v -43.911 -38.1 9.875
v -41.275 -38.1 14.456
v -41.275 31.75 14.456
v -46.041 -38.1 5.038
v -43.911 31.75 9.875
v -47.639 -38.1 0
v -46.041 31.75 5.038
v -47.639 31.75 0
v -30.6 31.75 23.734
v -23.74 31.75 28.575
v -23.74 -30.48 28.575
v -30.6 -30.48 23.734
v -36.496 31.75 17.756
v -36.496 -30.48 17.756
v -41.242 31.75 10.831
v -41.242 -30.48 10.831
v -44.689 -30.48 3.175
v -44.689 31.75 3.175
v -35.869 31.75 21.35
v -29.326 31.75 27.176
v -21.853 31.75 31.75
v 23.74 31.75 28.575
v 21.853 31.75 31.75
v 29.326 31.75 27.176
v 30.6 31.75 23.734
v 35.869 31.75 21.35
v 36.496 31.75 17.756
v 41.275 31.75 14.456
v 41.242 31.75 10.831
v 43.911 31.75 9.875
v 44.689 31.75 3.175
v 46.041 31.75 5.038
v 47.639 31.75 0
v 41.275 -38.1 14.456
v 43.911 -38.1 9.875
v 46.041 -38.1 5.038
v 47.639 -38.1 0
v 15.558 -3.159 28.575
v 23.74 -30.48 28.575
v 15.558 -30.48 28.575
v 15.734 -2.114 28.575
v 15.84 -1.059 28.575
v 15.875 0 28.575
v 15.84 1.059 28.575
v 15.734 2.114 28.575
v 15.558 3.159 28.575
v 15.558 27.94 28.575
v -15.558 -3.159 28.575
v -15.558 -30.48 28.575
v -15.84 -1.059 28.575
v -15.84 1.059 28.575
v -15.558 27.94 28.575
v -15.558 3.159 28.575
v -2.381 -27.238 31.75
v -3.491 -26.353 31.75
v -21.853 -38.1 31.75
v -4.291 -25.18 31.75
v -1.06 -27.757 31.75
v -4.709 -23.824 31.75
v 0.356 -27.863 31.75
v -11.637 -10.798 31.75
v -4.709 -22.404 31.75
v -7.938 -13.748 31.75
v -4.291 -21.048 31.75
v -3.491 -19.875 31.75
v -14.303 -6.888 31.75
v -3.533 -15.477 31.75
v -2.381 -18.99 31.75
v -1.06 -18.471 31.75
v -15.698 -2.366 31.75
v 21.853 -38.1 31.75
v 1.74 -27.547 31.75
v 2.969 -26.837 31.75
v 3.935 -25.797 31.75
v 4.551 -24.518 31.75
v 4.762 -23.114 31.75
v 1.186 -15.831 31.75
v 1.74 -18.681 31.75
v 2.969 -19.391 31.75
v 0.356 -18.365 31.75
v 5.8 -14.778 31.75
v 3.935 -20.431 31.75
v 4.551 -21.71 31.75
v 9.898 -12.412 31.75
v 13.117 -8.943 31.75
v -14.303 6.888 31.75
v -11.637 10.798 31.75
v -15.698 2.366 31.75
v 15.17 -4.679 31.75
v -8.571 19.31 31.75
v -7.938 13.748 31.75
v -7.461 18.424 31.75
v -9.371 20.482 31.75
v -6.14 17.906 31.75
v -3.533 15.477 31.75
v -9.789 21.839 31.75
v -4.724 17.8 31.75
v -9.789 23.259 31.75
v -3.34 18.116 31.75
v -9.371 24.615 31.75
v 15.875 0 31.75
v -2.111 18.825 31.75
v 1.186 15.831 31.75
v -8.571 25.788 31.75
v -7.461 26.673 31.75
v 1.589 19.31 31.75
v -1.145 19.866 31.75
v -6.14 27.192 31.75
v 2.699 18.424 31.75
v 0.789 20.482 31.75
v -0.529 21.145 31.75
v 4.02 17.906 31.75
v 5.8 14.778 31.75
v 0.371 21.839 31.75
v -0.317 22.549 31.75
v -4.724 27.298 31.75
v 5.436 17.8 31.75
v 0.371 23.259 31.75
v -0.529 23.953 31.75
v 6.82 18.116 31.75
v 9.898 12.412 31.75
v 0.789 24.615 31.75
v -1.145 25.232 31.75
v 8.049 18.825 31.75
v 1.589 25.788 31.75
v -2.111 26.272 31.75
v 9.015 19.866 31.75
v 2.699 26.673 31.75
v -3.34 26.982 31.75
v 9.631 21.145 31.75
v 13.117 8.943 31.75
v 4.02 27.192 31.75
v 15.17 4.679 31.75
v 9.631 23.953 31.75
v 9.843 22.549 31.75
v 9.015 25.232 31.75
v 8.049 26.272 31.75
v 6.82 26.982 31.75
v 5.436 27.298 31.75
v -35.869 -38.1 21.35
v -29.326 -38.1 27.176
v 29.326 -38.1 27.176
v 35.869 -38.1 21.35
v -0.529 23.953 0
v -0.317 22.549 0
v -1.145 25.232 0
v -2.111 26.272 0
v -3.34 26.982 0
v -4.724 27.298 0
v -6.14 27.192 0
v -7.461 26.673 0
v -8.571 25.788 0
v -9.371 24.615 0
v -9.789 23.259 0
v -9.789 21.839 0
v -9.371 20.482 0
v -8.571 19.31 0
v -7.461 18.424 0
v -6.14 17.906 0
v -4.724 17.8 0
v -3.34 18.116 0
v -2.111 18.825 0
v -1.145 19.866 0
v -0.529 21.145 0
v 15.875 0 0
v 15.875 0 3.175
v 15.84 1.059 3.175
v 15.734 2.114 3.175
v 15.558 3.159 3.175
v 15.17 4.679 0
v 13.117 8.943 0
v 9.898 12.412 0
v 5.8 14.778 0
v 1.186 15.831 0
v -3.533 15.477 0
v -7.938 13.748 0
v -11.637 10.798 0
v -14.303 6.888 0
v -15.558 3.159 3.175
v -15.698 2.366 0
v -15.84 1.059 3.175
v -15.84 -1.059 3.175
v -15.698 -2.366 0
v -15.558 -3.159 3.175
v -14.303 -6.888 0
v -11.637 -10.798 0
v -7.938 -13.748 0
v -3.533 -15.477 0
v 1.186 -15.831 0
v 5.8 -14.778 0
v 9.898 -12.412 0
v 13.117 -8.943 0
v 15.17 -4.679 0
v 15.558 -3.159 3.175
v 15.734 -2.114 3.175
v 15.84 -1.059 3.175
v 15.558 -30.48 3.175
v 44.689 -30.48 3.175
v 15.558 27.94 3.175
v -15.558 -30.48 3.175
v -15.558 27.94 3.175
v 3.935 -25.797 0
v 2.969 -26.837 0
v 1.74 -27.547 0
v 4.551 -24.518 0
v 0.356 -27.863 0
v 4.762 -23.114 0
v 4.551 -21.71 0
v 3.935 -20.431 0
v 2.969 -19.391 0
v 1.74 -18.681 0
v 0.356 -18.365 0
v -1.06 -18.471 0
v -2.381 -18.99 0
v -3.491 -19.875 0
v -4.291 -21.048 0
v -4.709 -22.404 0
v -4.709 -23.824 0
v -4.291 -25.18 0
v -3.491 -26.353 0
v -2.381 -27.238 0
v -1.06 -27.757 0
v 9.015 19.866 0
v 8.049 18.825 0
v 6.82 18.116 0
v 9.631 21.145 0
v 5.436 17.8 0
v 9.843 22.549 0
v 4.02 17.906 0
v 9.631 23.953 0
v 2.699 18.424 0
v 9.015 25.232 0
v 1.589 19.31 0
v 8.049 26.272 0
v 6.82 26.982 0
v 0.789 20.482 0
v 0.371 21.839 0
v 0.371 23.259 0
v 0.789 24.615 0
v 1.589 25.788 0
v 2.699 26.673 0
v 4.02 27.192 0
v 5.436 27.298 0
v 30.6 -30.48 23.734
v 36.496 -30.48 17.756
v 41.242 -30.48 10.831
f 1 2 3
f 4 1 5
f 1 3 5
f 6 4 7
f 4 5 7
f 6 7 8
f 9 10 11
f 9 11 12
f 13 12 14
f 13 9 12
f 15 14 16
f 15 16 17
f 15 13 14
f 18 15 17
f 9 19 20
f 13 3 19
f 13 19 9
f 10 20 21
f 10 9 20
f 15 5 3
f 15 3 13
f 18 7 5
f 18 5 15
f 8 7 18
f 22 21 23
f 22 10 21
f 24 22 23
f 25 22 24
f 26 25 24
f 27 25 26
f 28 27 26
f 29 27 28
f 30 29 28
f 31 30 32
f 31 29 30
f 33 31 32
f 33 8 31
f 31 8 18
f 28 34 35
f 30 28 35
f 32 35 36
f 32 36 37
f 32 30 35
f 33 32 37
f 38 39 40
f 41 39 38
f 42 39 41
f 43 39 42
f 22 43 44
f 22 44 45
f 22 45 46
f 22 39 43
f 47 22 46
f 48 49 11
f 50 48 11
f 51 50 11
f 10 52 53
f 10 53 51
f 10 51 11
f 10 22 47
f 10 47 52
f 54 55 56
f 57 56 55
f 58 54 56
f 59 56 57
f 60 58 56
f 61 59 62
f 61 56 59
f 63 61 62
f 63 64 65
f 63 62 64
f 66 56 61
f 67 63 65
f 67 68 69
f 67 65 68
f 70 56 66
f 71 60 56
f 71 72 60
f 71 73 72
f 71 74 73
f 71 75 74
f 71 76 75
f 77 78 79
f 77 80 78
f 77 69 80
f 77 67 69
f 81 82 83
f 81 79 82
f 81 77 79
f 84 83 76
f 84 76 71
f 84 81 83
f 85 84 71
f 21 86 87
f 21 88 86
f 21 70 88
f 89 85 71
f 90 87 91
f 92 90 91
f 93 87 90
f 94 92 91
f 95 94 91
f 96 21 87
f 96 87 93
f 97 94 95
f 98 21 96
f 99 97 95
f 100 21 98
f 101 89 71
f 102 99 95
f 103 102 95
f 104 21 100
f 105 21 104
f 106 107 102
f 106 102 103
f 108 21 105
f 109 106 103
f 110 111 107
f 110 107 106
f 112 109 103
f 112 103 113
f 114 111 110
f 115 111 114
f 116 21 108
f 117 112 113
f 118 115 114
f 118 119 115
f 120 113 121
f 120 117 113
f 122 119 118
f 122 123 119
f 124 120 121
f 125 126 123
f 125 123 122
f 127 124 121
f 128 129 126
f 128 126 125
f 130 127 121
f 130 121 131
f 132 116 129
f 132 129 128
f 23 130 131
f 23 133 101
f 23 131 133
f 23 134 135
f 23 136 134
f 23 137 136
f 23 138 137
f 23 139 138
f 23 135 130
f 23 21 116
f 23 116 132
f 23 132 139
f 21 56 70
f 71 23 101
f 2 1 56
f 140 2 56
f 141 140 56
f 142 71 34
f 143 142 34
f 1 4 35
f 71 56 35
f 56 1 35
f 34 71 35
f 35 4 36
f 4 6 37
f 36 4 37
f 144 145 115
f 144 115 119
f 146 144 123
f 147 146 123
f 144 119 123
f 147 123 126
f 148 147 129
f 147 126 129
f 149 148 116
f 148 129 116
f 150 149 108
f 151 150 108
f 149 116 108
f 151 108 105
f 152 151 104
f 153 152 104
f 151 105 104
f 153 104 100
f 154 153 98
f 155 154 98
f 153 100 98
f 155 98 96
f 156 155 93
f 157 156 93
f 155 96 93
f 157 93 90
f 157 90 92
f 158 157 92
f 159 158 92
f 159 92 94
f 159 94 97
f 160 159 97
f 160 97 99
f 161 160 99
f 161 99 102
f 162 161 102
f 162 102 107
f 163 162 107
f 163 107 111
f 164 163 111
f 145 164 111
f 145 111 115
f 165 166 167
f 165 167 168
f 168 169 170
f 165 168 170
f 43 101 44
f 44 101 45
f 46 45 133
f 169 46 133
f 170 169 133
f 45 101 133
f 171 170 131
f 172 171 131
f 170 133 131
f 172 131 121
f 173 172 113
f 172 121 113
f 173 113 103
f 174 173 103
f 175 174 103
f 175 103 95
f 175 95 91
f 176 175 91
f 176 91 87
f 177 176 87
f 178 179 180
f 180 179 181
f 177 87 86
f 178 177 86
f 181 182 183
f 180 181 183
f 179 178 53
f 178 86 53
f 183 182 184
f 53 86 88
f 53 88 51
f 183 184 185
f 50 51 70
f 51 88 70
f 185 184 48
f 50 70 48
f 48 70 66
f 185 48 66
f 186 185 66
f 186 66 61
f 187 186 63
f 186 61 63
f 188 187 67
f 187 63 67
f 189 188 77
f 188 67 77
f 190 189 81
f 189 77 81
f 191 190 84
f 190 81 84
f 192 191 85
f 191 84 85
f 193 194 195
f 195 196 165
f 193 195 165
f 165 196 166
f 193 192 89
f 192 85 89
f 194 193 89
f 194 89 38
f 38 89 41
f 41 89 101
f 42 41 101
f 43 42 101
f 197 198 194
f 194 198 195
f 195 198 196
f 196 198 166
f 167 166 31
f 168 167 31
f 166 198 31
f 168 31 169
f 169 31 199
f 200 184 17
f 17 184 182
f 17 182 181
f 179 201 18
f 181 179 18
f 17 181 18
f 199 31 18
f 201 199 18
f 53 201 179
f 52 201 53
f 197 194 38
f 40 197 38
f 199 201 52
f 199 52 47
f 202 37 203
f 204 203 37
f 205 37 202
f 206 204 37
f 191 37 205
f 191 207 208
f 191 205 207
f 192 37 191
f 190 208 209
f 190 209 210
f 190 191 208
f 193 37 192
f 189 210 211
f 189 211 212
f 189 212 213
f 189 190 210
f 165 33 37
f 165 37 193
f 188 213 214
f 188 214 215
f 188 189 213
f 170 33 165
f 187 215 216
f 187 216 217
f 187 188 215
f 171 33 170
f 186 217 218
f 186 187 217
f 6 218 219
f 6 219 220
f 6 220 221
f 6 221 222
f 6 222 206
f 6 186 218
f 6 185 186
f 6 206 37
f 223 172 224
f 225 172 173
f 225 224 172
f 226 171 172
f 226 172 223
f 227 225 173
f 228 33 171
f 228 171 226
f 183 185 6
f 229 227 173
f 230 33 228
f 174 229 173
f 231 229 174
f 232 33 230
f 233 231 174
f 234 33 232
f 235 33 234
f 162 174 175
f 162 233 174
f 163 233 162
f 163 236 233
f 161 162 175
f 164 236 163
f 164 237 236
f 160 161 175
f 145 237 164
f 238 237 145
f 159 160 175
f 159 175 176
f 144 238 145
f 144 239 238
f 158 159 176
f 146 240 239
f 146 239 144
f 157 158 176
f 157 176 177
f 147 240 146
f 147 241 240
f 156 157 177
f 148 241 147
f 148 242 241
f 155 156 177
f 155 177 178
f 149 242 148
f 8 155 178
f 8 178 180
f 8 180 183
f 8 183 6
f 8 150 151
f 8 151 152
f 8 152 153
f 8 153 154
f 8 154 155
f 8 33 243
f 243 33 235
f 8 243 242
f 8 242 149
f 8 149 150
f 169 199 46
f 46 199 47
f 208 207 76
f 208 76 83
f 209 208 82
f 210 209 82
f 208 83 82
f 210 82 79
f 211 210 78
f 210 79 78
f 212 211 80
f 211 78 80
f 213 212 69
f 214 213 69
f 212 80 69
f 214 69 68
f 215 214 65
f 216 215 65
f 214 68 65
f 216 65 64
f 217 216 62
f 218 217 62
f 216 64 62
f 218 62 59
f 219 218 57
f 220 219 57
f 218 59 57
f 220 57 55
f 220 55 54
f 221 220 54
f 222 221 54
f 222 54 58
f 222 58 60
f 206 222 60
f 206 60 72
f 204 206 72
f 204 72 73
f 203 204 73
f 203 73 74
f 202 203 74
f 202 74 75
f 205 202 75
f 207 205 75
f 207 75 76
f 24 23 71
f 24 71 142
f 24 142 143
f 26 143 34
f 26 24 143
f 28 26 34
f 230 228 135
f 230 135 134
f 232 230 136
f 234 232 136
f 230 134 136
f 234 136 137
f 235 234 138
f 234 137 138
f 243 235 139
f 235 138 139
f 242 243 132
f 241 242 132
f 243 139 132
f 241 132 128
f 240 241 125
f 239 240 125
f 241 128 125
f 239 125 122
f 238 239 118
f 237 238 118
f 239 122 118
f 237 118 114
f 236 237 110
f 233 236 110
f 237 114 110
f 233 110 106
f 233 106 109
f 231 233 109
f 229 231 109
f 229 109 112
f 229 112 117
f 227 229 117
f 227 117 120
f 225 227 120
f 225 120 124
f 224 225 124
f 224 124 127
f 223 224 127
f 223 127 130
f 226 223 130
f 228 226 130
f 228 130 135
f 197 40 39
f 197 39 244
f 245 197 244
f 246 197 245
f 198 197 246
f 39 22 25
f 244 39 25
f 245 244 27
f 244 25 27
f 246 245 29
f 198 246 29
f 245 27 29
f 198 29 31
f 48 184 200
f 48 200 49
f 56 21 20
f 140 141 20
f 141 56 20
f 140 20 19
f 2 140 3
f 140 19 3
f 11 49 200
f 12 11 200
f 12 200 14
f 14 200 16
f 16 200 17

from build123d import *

# Parameters (mm, degrees)
SKETCH1_W           = 82.55
SKETCH1_H           = 76.2
BOSS_EXTRUDE1_DEPTH = 31.75
SKETCH2_R           = 4.7625
CUT_EXTRUDE1_DEPTH  = 32.75
SKETCH4_R           = 15.875
CUT_EXTRUDE3_DEPTH  = 32.75
BOSS_EXTRUDE3_DEPTH = 76.2
CUT_EXTRUDE5_DEPTH  = 77.2
CUT_EXTRUDE6_DEPTH  = 62.23
SKETCH9_W           = 31.115
SKETCH9_H           = 3.81
CUT_EXTRUDE7_DEPTH  = 25.4


with BuildPart() as part:
    # Sketch1 → Boss-Extrude1 (new body)
    with BuildSketch(Plane.XY):
        Rectangle(SKETCH1_W, SKETCH1_H)
    extrude(amount=BOSS_EXTRUDE1_DEPTH)

    # Sketch2 → Cut-Extrude1 (cut, through all)
    with BuildSketch(Plane.XY.offset(31.75)):
        with Locations((0, -23.114)):
            Circle(SKETCH2_R)
        with Locations((-5.08, 22.548849106)):
            Circle(SKETCH2_R)
        with Locations((5.08, 22.548849106)):
            Circle(SKETCH2_R)
    extrude(amount=-CUT_EXTRUDE1_DEPTH, mode=Mode.SUBTRACT)

    # Sketch4 → Cut-Extrude3 (cut, through all)
    with BuildSketch(Plane.XY.offset(31.75)):
        Circle(SKETCH4_R)
    extrude(amount=-CUT_EXTRUDE3_DEPTH, mode=Mode.SUBTRACT)

    # Sketch7 → Boss-Extrude3 (add, through all)
    with BuildSketch(Plane(origin=(0, 38.1, 0), x_dir=(1, 0, 0), z_dir=(0, 1, 0))):
        with BuildLine():
            Line((-47.639122, 0), (-41.275, 0))
            Line((-41.275, 0), (-41.275, -14.455684538))
            ThreePointArc((-41.275, -14.455684538), (-45.040781261, -7.484825392), (-47.639122, 0))
        make_face()
    boss_extrude3 = extrude(amount=-BOSS_EXTRUDE3_DEPTH)

    # Sketch6 → Cut-Extrude5 (cut, through all)
    with BuildSketch(Plane(origin=(0, 38.1, 0), x_dir=(1, 0, 0), z_dir=(0, 1, 0))):
        with BuildLine():
            Line((-41.275, -14.455684538), (-41.275, -31.75))
            Line((-41.275, -31.75), (-21.853009973, -31.75))
            ThreePointArc((-21.853009973, -31.75), (-32.727049174, -24.408972752), (-41.275, -14.455684538))
        make_face()
    cut_extrude5 = extrude(amount=-CUT_EXTRUDE5_DEPTH, mode=Mode.SUBTRACT)

    # Mirror2: Boss-Extrude3, Cut-Extrude5 across plane
    add(boss_extrude3.mirror(Plane(origin=(0, 0, 0), x_dir=(0, 0, 1), z_dir=(1, 0, 0))))
    add(cut_extrude5.mirror(Plane(origin=(0, 0, 0), x_dir=(0, 0, 1), z_dir=(1, 0, 0))), mode=Mode.SUBTRACT)


with BuildPart() as body_2:
    # Split1: the piece on the far side of the plane
    add(part.part)
    split(bisect_by=Plane(origin=(0, 31.75, 0), x_dir=(1, 0, 0), z_dir=(0, 1, 0)), keep=Keep.BOTTOM)

    # Sketch8 → Cut-Extrude6 (cut)
    with BuildSketch(Plane(origin=(0, 31.75, 0), x_dir=(1, 0, 0), z_dir=(0, 1, 0))):
        with BuildLine():
            Line((-44.689459382, -3.175), (-15.5575, -3.175))
            Line((-15.5575, -3.175), (-15.5575, -28.575))
            Line((-15.5575, -28.575), (-23.740308757, -28.575))
            ThreePointArc((-23.740308757, -28.575), (-36.495866778, -17.756285446), (-44.689459382, -3.175))
        make_face()
    cut_extrude6 = extrude(amount=-CUT_EXTRUDE6_DEPTH, mode=Mode.SUBTRACT)

    # Mirror3: Cut-Extrude6 across plane
    add(cut_extrude6.mirror(Plane(origin=(0, 0, 0), x_dir=(0, 0, 1), z_dir=(1, 0, 0))), mode=Mode.SUBTRACT)

    # Sketch9 → Cut-Extrude7 (cut)
    with BuildSketch(Plane.XY.offset(3.175)):
        with Locations((0, 29.845)):
            Rectangle(SKETCH9_W, SKETCH9_H)
    extrude(amount=CUT_EXTRUDE7_DEPTH, mode=Mode.SUBTRACT)


with BuildPart() as part_1:
    add(part.part)

    # Split1
    split(bisect_by=Plane(origin=(0, 31.75, 0), x_dir=(1, 0, 0), z_dir=(0, 1, 0)), keep=Keep.TOP)


solid = body_2.part
